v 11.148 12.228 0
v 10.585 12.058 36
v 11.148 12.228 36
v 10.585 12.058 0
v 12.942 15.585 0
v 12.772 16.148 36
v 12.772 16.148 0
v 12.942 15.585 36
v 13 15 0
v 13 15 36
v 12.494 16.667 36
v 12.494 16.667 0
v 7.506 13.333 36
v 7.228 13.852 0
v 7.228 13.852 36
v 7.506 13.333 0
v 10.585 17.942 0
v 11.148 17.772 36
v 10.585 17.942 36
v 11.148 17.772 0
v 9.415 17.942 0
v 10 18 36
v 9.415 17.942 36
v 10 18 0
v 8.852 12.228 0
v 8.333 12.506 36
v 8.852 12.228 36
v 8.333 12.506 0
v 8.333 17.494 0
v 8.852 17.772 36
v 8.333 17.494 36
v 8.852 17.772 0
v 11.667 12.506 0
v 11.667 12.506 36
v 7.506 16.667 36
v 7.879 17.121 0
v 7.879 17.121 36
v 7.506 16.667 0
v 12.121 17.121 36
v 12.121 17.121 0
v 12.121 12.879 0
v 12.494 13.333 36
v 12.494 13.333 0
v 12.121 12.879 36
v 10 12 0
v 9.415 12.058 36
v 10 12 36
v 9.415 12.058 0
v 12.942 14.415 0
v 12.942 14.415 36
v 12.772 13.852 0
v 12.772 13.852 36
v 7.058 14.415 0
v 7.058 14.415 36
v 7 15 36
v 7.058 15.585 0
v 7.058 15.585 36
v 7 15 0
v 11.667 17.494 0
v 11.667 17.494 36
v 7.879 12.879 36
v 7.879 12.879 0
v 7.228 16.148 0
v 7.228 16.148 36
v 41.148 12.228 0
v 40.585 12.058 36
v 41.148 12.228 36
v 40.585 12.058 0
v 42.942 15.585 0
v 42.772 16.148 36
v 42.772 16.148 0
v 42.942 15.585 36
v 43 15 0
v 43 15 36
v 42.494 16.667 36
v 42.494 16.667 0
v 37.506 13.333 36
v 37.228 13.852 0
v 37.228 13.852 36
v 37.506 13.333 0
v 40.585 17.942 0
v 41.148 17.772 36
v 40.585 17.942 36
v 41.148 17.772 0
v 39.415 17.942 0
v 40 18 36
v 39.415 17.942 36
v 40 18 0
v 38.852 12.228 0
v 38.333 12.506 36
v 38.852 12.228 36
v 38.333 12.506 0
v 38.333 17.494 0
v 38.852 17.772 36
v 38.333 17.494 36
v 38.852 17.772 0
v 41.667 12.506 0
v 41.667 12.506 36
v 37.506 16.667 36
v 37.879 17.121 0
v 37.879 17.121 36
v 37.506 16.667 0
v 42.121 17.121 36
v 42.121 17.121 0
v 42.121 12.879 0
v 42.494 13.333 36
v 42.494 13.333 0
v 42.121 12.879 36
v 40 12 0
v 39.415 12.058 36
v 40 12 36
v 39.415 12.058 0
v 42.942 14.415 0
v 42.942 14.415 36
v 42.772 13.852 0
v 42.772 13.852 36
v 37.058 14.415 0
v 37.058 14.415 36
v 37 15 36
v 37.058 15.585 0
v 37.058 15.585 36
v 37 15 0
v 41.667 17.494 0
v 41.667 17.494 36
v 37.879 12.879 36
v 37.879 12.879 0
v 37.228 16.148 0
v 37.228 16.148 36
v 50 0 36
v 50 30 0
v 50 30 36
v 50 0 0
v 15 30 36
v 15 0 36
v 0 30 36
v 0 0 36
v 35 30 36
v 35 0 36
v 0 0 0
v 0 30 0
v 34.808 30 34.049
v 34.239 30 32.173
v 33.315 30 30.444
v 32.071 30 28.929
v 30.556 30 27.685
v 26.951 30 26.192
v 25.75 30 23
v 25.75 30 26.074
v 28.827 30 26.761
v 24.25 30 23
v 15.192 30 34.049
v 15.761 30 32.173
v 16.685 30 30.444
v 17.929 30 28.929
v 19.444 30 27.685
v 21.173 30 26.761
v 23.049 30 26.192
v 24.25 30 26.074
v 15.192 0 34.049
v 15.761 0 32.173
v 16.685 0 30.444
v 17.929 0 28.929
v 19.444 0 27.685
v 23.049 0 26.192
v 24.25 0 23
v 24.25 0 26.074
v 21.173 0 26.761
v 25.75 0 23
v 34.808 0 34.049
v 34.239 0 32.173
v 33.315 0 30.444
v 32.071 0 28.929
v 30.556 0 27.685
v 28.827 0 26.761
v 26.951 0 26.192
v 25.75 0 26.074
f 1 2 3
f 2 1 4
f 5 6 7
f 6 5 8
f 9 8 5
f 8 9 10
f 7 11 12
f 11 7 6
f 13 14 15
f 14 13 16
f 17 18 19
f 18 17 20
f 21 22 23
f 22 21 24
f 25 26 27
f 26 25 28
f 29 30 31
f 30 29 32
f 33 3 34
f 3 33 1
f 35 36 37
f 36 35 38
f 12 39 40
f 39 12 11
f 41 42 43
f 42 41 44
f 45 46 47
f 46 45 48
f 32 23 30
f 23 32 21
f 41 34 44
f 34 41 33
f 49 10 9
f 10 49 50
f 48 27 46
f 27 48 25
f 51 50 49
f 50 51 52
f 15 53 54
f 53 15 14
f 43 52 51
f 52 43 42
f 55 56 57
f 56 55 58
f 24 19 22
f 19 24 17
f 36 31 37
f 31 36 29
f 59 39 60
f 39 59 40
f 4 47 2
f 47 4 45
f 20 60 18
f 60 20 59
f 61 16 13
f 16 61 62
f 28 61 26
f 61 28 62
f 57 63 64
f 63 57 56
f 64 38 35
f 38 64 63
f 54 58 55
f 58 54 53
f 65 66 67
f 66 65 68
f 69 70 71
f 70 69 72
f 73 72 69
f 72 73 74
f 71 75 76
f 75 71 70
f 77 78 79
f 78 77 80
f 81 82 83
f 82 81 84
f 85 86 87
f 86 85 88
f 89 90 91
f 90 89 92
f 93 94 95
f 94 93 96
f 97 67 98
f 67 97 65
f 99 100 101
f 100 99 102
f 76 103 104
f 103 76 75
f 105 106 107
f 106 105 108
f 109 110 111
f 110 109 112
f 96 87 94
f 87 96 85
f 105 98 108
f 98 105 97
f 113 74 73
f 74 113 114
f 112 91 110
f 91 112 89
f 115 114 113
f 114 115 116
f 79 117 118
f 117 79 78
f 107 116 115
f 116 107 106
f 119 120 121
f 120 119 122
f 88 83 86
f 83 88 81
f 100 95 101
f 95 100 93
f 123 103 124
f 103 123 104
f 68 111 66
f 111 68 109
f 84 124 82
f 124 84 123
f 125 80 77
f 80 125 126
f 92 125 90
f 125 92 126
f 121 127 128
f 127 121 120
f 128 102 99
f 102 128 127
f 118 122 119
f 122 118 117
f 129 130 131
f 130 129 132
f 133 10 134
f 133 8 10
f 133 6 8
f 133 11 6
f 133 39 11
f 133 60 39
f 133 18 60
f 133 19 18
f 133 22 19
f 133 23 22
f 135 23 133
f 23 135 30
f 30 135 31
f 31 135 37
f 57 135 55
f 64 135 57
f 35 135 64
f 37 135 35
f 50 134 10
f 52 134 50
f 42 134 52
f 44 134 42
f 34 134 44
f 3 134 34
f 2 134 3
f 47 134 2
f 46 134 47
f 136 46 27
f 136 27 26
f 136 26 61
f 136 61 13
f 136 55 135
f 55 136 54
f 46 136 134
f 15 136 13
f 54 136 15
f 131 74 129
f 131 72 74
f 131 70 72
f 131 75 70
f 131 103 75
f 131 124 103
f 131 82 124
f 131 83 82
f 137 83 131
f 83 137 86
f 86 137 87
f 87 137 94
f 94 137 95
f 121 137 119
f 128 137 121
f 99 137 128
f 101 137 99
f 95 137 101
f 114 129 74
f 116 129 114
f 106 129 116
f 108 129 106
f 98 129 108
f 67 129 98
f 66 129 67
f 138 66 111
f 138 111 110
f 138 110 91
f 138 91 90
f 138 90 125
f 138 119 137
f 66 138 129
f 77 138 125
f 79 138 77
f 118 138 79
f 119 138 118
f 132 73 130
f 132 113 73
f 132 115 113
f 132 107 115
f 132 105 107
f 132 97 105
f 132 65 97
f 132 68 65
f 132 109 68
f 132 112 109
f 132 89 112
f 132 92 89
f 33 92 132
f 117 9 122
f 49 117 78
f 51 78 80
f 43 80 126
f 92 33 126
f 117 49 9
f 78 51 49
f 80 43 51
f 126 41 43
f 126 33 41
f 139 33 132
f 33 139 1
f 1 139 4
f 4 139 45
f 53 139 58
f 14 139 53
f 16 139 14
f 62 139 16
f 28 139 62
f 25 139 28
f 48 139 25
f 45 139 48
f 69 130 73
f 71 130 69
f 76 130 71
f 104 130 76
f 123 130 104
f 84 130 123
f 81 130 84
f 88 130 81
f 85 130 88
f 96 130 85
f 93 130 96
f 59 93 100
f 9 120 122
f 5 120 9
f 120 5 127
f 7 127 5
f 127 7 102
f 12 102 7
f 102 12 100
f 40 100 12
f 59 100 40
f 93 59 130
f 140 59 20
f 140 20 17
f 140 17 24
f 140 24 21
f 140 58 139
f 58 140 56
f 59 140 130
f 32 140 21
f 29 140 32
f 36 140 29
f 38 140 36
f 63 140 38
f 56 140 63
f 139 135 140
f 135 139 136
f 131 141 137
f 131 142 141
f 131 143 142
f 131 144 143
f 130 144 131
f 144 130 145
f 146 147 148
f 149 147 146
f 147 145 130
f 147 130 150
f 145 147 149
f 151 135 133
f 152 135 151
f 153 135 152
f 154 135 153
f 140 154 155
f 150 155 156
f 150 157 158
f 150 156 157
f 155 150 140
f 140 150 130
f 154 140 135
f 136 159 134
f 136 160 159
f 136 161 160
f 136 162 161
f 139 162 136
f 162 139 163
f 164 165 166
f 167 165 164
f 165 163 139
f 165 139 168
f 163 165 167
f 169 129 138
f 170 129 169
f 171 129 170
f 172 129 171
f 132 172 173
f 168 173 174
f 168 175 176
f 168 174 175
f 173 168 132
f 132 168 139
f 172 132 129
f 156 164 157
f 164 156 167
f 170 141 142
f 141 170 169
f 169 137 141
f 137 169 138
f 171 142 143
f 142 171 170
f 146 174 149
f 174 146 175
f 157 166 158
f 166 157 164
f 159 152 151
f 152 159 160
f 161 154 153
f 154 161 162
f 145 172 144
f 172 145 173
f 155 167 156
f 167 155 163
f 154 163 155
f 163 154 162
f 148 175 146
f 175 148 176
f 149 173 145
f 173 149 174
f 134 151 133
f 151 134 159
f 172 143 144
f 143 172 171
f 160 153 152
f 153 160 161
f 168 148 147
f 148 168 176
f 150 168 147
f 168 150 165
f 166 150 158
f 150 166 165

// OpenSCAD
$fn = 32;

// ----------------------------------------------------------------------
// Saddle clamp: split shaft clamp
// ----------------------------------------------------------------------

// --- parameters (mm) ---
blk_l = 50;               // block length, X
blk_w = 30;               // block width, Y
blk_h = 36;               // block height
clamp_r = 10;             // shaft groove radius
hole_r = 3;               // bolt hole radius
hole_m = 10;              // bolt hole margin from the ends
saw_w = 1.5;              // saw kerf width

saw_depth = clamp_r + 3;  // saw kerf depth

difference() {
  cube([blk_l, blk_w, blk_h]);
  translate([blk_l / 2, -1, blk_h])
    rotate([-90, 0, 0])
      cylinder(h = blk_w + 2, r = clamp_r);
  for (sx = [0, 1])
    translate([sx ? blk_l - hole_m : hole_m, blk_w / 2, -1])
      cylinder(r = hole_r, h = blk_h + 2);
  translate([blk_l / 2 - saw_w / 2, -1, blk_h - saw_depth])
    cube([saw_w, blk_w + 2, saw_depth + 1]);
}
